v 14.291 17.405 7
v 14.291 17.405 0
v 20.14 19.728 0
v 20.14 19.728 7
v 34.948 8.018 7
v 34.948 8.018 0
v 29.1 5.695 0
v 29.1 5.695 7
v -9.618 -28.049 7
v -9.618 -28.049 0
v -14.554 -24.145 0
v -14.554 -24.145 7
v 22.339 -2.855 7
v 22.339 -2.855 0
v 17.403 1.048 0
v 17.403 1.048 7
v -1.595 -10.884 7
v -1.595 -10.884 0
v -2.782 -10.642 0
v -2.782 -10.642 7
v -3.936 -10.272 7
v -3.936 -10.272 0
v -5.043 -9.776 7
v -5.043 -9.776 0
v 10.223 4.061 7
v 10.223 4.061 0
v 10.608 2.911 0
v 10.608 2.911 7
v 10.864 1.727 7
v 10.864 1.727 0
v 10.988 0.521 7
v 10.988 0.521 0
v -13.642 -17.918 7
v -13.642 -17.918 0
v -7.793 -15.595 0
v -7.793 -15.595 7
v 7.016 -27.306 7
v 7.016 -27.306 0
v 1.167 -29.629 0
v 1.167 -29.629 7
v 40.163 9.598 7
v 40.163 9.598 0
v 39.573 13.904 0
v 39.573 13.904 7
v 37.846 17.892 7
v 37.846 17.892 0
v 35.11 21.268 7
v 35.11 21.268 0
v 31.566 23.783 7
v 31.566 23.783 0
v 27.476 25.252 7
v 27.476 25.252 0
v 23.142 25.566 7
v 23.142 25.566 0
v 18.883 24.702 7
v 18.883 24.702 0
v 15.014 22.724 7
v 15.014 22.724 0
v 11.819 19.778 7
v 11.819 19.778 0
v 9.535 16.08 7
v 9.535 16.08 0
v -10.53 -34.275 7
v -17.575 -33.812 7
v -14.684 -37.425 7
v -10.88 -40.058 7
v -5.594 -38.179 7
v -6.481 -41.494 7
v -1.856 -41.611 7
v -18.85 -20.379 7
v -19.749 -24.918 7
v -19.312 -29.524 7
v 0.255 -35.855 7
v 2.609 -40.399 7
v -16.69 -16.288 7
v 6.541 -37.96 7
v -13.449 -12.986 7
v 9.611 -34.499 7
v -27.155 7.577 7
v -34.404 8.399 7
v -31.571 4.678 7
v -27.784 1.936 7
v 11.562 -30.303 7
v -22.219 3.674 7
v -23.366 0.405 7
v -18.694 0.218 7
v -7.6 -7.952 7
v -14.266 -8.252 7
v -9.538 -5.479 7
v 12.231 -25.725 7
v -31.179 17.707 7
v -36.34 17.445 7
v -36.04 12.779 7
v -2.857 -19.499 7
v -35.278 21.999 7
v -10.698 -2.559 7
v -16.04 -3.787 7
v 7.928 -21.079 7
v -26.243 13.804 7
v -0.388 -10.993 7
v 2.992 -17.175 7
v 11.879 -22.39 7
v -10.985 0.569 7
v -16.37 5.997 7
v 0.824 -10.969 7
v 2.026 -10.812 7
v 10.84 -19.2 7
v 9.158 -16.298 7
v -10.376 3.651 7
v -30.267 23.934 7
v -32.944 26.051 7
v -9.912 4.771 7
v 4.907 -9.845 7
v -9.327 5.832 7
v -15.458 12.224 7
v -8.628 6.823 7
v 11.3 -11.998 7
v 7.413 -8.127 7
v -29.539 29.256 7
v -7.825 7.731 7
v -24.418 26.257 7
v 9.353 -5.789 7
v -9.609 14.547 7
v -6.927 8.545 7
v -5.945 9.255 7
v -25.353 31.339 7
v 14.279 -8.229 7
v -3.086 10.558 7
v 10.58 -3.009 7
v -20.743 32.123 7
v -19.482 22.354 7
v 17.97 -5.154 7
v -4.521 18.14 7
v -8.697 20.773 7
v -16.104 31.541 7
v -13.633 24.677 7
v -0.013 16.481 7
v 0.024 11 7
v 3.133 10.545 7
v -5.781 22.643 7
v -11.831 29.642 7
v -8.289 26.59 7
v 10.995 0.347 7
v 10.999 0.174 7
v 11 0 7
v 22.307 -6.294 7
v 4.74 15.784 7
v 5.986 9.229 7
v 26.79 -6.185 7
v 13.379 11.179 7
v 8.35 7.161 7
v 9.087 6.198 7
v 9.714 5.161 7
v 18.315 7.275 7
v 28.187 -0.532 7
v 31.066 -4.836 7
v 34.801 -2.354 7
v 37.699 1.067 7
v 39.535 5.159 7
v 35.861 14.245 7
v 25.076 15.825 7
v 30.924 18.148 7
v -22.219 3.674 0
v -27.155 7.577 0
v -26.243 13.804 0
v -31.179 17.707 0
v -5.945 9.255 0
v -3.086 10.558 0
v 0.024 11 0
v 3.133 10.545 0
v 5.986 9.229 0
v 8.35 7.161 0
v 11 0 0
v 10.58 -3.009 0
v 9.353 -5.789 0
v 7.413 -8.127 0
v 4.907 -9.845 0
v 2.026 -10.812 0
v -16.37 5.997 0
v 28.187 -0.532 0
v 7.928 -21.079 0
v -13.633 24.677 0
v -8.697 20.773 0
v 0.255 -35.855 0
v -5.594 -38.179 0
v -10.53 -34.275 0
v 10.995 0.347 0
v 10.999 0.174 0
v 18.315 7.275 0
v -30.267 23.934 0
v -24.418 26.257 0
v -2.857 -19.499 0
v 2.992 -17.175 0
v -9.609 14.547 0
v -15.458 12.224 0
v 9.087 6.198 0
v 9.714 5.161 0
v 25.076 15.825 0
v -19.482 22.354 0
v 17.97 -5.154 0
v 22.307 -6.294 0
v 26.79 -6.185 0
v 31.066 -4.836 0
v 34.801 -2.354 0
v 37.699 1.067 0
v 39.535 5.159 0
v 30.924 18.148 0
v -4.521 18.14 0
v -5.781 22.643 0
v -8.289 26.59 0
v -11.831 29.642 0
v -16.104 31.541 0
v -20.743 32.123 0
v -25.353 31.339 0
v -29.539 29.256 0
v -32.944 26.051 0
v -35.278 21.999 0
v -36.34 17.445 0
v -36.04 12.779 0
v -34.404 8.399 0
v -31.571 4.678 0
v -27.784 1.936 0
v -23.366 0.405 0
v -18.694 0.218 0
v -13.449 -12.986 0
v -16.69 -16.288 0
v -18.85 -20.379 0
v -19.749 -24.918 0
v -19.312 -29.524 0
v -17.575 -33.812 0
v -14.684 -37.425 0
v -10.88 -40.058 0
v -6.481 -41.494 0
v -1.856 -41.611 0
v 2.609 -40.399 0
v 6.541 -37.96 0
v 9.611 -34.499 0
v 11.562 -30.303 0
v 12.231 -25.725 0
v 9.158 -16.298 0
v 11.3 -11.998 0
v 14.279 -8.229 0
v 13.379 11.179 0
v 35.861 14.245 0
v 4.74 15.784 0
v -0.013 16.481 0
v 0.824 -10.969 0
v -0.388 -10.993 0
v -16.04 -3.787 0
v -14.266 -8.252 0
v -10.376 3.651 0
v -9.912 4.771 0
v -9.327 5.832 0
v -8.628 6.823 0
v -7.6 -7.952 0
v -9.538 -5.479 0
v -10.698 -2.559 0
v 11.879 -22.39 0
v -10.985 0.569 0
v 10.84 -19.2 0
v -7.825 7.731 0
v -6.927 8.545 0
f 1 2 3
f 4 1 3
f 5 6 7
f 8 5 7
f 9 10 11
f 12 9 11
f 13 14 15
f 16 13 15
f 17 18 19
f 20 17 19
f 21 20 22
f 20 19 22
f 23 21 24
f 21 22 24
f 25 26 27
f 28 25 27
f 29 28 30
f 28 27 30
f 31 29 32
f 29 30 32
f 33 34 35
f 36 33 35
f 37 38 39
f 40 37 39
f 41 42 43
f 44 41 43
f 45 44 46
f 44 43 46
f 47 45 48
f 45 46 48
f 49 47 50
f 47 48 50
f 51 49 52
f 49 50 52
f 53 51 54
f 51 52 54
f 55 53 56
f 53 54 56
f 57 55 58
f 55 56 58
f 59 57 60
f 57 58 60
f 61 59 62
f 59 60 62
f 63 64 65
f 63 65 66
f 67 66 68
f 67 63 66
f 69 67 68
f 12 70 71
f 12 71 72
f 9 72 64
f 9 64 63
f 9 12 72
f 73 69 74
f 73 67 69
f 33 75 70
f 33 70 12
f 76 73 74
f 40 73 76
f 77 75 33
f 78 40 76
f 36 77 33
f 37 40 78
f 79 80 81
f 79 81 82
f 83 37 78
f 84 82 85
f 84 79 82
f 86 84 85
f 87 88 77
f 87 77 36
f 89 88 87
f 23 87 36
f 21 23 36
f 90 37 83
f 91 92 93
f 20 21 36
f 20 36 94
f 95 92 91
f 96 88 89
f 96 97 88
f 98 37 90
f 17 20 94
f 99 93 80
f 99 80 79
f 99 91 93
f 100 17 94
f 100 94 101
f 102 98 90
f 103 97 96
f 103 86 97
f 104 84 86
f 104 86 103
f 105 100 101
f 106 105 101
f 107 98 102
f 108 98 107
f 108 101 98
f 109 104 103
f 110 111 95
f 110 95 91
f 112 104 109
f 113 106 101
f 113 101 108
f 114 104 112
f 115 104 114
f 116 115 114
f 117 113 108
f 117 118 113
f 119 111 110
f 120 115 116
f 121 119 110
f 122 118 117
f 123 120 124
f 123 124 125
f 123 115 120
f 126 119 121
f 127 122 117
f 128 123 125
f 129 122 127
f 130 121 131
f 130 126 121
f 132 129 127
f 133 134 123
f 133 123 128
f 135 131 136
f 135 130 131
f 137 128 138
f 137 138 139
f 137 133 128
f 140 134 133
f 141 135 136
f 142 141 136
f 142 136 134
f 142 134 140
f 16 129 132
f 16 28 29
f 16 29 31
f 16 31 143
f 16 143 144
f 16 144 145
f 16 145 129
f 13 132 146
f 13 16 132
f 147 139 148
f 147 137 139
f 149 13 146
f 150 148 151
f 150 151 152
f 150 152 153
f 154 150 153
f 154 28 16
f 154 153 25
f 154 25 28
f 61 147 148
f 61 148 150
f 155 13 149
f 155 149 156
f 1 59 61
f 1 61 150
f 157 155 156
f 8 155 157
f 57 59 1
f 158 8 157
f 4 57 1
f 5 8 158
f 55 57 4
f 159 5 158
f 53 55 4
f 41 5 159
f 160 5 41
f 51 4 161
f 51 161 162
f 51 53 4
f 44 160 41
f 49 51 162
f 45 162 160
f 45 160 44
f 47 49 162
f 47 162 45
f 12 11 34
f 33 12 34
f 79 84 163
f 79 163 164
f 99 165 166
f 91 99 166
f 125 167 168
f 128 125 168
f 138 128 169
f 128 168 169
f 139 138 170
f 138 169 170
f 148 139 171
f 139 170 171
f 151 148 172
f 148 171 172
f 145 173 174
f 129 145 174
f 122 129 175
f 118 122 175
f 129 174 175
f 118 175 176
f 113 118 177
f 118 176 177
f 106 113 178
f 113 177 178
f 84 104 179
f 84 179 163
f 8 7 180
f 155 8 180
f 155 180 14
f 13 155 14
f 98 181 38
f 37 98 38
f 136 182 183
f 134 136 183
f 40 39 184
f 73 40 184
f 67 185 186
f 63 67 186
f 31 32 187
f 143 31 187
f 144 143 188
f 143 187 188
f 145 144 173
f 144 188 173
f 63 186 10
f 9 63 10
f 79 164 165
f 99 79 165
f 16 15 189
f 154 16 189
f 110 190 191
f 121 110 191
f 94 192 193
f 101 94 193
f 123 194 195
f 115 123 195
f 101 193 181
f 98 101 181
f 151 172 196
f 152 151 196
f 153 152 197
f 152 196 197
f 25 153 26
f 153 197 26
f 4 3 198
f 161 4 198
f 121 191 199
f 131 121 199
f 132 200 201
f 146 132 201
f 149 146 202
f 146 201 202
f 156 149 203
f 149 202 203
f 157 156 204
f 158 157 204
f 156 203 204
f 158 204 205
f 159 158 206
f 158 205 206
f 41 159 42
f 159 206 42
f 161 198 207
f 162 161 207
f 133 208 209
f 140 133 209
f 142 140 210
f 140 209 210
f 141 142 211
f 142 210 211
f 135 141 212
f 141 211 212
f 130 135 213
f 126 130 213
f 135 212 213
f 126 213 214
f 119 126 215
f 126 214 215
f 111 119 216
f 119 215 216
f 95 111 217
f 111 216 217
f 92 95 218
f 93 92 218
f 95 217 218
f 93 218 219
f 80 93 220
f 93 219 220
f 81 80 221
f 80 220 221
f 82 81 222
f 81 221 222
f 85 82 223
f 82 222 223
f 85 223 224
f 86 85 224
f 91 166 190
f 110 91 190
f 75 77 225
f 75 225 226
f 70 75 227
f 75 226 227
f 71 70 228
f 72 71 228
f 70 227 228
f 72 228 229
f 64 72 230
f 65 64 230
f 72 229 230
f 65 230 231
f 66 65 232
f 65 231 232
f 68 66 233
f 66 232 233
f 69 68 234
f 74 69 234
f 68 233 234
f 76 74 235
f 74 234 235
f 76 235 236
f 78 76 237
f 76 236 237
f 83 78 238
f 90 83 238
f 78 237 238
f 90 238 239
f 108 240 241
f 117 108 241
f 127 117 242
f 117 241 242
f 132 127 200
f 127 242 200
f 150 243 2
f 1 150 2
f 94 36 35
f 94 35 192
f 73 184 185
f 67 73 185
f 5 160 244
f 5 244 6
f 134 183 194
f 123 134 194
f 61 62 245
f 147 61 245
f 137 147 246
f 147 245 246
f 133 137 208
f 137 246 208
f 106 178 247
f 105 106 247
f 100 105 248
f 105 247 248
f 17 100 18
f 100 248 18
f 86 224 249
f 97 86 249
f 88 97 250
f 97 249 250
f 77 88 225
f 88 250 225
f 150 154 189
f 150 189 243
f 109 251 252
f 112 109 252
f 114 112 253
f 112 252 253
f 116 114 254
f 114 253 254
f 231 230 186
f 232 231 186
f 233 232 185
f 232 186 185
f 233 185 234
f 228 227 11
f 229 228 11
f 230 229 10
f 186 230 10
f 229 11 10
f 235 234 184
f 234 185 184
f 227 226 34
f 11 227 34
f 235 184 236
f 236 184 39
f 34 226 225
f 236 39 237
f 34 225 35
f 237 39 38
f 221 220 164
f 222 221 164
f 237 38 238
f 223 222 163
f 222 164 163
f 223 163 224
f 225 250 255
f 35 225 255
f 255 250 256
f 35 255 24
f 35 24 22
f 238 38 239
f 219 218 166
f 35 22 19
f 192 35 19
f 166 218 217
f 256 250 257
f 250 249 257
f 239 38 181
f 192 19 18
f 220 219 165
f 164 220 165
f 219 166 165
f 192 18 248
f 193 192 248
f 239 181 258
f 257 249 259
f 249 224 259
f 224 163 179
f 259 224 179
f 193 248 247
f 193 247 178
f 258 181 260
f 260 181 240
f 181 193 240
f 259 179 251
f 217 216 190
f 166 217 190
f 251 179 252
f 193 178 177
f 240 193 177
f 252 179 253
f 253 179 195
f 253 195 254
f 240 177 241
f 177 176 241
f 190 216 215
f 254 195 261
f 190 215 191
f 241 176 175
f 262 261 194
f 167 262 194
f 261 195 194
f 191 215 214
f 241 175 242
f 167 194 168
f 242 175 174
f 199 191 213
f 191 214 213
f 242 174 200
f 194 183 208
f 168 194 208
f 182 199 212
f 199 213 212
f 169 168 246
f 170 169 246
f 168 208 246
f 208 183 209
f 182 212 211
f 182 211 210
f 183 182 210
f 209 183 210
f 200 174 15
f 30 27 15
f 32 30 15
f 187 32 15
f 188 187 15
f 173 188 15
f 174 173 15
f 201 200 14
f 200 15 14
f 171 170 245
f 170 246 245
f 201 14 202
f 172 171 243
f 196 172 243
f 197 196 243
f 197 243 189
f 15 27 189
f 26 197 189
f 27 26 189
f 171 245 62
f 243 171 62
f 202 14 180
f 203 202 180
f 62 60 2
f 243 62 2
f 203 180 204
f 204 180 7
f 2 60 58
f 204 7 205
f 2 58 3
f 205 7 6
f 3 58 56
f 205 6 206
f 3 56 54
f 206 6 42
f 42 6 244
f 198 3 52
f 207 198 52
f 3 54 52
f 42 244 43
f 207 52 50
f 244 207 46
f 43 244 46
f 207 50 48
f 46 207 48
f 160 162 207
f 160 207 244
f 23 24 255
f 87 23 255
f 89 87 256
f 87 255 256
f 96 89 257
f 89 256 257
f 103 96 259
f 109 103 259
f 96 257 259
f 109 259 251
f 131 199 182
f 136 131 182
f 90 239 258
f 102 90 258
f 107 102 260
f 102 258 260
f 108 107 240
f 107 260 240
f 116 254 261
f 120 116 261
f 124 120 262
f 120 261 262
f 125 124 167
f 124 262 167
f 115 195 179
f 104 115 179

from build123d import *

# Parameters (mm, degrees)
F1_DEPTH = 7


with BuildPart() as f1:
    # F0 (on Top) → F1 (new body)
    with BuildSketch(Plane.XY):
        with BuildLine():
            ThreePointArc((13.9404458706, 5.5375056594), (14.7327303657, 2.818981371), (15, 0))
            ThreePointArc((15, 0), (14.910105435, -1.6397426375), (14.641499211, -3.2598314149))
            ThreePointArc((14.641499211, -3.2598314149), (16.2490479671, -4.3071380253), (17.9703990001, -5.1544955417))
            ThreePointArc((17.9703990001, -5.1544955417), (20.0933334601, -3.8883563859), (22.3387689603, -2.8549259348))
            Line((22.3387689603, -2.8549259348), (17.4025129068, 1.0484968591))
            Line((17.4025129068, 1.0484968591), (18.3148481812, 7.2751313979))
            Line((18.3148481812, 7.2751313979), (13.9404458706, 5.5375056594))
        make_face()
        with BuildLine():
            ThreePointArc((8.413853575, 12.4180138516), (11.6946151785, 9.393400653), (13.9404458706, 5.5375056594))
            Line((13.9404458706, 5.5375056594), (18.3148481812, 7.2751313979))
            Line((18.3148481812, 7.2751313979), (13.3785921276, 11.1785541917))
            Line((13.3785921276, 11.1785541917), (14.290927402, 17.4051887306))
            ThreePointArc((14.290927402, 17.4051887306), (11.948407394, 16.6161645896), (9.5353183296, 16.0804778806))
            ThreePointArc((9.5353183296, 16.0804778806), (8.864593701, 14.2829260421), (8.413853575, 12.4180138516))
        make_face()
        with BuildLine():
            ThreePointArc((17.9703990001, -5.1544955417), (16.2490479671, -4.3071380253), (14.641499211, -3.2598314149))
            ThreePointArc((14.641499211, -3.2598314149), (11.76584351, -9.3040274344), (6.5473886725, -13.4956178655))
            ThreePointArc((6.5473886725, -13.4956178655), (7.9370799423, -14.8184263603), (9.1584431848, -16.2980668469))
            ThreePointArc((9.1584431848, -16.2980668469), (12.6917707898, -10.0362191218), (17.9703990001, -5.1544955417))
        make_face()
        with BuildLine():
            ThreePointArc((-4.4976527882, 14.3098259737), (2.1746023607, 14.8415330938), (8.413853575, 12.4180138516))
            ThreePointArc((8.413853575, 12.4180138516), (8.864593701, 14.2829260421), (9.5353183296, 16.0804778806))
            ThreePointArc((9.5353183296, 16.0804778806), (2.3457353225, 16.0095054839), (-4.5212754173, 18.1400698211))
            ThreePointArc((-4.5212754173, 18.1400698211), (-4.4259470549, 17.1355310008), (-4.3941287506, 16.1269808862))
            ThreePointArc((-4.3941287506, 16.1269808862), (-4.420030726, 15.216930173), (-4.4976527882, 14.3098259737))
        make_face()
        with BuildLine():
            ThreePointArc((9.1584431848, -16.2980668469), (7.9370799423, -14.8184263603), (6.5473886725, -13.4956178655))
            ThreePointArc((6.5473886725, -13.4956178655), (2.2876160042, -14.8245341585), (-2.1746023607, -14.8415330938))
            Line((-2.1746023607, -14.8415330938), (-2.8569754841, -19.4986894903))
            Line((-2.8569754841, -19.4986894903), (2.9916158438, -17.1754777453))
            Line((2.9916158438, -17.1754777453), (7.9278718973, -21.0789005391))
            ThreePointArc((7.9278718973, -21.0789005391), (8.4158169511, -18.6557066328), (9.1584431848, -16.2980668469))
        make_face()
        with BuildLine():
            ThreePointArc((22.3387689603, -2.8549259348), (20.0933334601, -3.8883563859), (17.9703990001, -5.1544955417))
            ThreePointArc((17.9703990001, -5.1544955417), (33.0209603772, -3.7262328005), (40.1634395091, 9.598343143))
            ThreePointArc((40.1634395091, 9.598343143), (27.4762978767, 25.2516165845), (9.5353183296, 16.0804778806))
            ThreePointArc((9.5353183296, 16.0804778806), (11.948407394, 16.6161645896), (14.290927402, 17.4051887306))
            Line((14.290927402, 17.4051887306), (20.1395187299, 19.7284004756))
            Line((20.1395187299, 19.7284004756), (25.0757747835, 15.8249776818))
            Line((25.0757747835, 15.8249776818), (30.9243661114, 18.1481894269))
            Line((30.9243661114, 18.1481894269), (35.8606221649, 14.244766633))
            Line((35.8606221649, 14.244766633), (34.9482868906, 8.0181320942))
            Line((34.9482868906, 8.0181320942), (29.0996955626, 5.6949203491))
            Line((29.0996955626, 5.6949203491), (28.1873602883, -0.5317141897))
            Line((28.1873602883, -0.5317141897), (22.3387689603, -2.8549259348))
        make_face()
        with BuildLine():
            ThreePointArc((-11.76584351, 9.3040274344), (-8.5082214777, 12.353548773), (-4.4976527882, 14.3098259737))
            ThreePointArc((-4.4976527882, 14.3098259737), (-4.420030726, 15.216930173), (-4.3941287506, 16.1269808862))
            ThreePointArc((-4.3941287506, 16.1269808862), (-4.4259470549, 17.1355310008), (-4.5212754173, 18.1400698211))
            ThreePointArc((-4.5212754173, 18.1400698211), (-6.6792513209, 19.3455154161), (-8.6969460947, 20.7734043763))
            Line((-8.6969460947, 20.7734043763), (-9.6092813691, 14.5467698375))
            Line((-9.6092813691, 14.5467698375), (-15.457872697, 12.2235580924))
            Line((-15.457872697, 12.2235580924), (-11.76584351, 9.3040274344))
        make_face()
        with BuildLine():
            Line((-2.8569754841, -19.4986894903), (-2.1746023607, -14.8415330938))
            ThreePointArc((-2.1746023607, -14.8415330938), (-6.4443763254, -13.5451103272), (-10.1438464229, -11.0499945588))
            ThreePointArc((-10.1438464229, -11.0499945588), (-11.8546149311, -11.9185193142), (-13.4491235829, -12.9855742794))
            ThreePointArc((-13.4491235829, -12.9855742794), (-13.4140821392, -15.4571590302), (-13.6418228656, -17.9184784416))
            Line((-13.6418228656, -17.9184784416), (-7.7932315377, -15.5952666965))
            Line((-7.7932315377, -15.5952666965), (-2.8569754841, -19.4986894903))
        make_face()
        with BuildLine():
            ThreePointArc((12.2306892415, -25.7253240292), (11.4432508781, -20.7677068139), (9.1584431848, -16.2980668469))
            ThreePointArc((9.1584431848, -16.2980668469), (8.4158169511, -18.6557066328), (7.9278718973, -21.0789005391))
            Line((7.9278718973, -21.0789005391), (7.0155366229, -27.3055350779))
            Line((7.0155366229, -27.3055350779), (1.166945295, -29.628746823))
            Line((1.166945295, -29.628746823), (0.2546100206, -35.8553813618))
            Line((0.2546100206, -35.8553813618), (-5.5939813073, -38.1785931069))
            Line((-5.5939813073, -38.1785931069), (-10.5302373608, -34.2751703131))
            Line((-10.5302373608, -34.2751703131), (-9.6179020864, -28.0485357742))
            Line((-9.6179020864, -28.0485357742), (-14.55415814, -24.1451129804))
            Line((-14.55415814, -24.1451129804), (-13.6418228656, -17.9184784416))
            ThreePointArc((-13.6418228656, -17.9184784416), (-13.4140821392, -15.4571590302), (-13.4491235829, -12.9855742794))
            ThreePointArc((-13.4491235829, -12.9855742794), (-10.8799715861, -40.0584500872), (12.2306892415, -25.7253240292))
        make_face()
        with BuildLine():
            ThreePointArc((-14.9612422475, 1.0776040139), (-13.9822311827, 5.4311335055), (-11.76584351, 9.3040274344))
            Line((-11.76584351, 9.3040274344), (-15.457872697, 12.2235580924))
            Line((-15.457872697, 12.2235580924), (-16.3702079714, 5.9969235536))
            Line((-16.3702079714, 5.9969235536), (-22.2187992993, 3.6737118085))
            ThreePointArc((-22.2187992993, 3.6737118085), (-20.3642243451, 2.0395420431), (-18.6937615143, 0.2175889663))
            ThreePointArc((-18.6937615143, 0.2175889663), (-16.8016736433, 0.5355003182), (-14.9612422475, 1.0776040139))
        make_face()
        with BuildLine():
            ThreePointArc((-8.6969460947, 20.7734043763), (-6.6792513209, 19.3455154161), (-4.5212754173, 18.1400698211))
            ThreePointArc((-4.5212754173, 18.1400698211), (-32.9443618279, 26.0512768162), (-18.6937615143, 0.2175889663))
            ThreePointArc((-18.6937615143, 0.2175889663), (-20.3642243451, 2.0395420431), (-22.2187992993, 3.6737118085))
            Line((-22.2187992993, 3.6737118085), (-27.1550553529, 7.5771346023))
            Line((-27.1550553529, 7.5771346023), (-26.2427200785, 13.8037691412))
            Line((-26.2427200785, 13.8037691412), (-31.178976132, 17.707191935))
            Line((-31.178976132, 17.707191935), (-30.2666408577, 23.9338264738))
            Line((-30.2666408577, 23.9338264738), (-24.4180495297, 26.2570382189))
            Line((-24.4180495297, 26.2570382189), (-19.4817934762, 22.3536154251))
            Line((-19.4817934762, 22.3536154251), (-13.6332021483, 24.6768271701))
            Line((-13.6332021483, 24.6768271701), (-8.6969460947, 20.7734043763))
        make_face()
        with BuildLine():
            ThreePointArc((-13.4491235829, -12.9855742794), (-11.8546149311, -11.9185193142), (-10.1438464229, -11.0499945588))
            ThreePointArc((-10.1438464229, -11.0499945588), (-13.9404458706, -5.5375056594), (-14.9612422475, 1.0776040139))
            ThreePointArc((-14.9612422475, 1.0776040139), (-16.8016736433, 0.5355003182), (-18.6937615143, 0.2175889663))
            ThreePointArc((-18.6937615143, 0.2175889663), (-15.0375061123, -5.9732863621), (-13.4491235829, -12.9855742794))
        make_face()
        with BuildLine():
            ThreePointArc((14.641499211, -3.2598314149), (14.910105435, -1.6397426375), (15, 0))
            ThreePointArc((15, 0), (14.7327303657, 2.818981371), (13.9404458706, 5.5375056594))
            Line((13.9404458706, 5.5375056594), (10.2229936385, 4.0608374836))
            ThreePointArc((10.2229936385, 4.0608374836), (10.7520038701, 2.3225875179), (10.9876563598, 0.5209680597))
            ThreePointArc((10.9876563598, 0.5209680597), (12.658211411, -1.5205473777), (14.641499211, -3.2598314149))
        make_face()
        with BuildLine():
            Line((10.2229936385, 4.0608374836), (13.9404458706, 5.5375056594))
            ThreePointArc((13.9404458706, 5.5375056594), (11.6946151785, 9.393400653), (8.413853575, 12.4180138516))
            ThreePointArc((8.413853575, 12.4180138516), (8.1646104404, 9.7919107843), (8.3502441941, 7.1605462012))
            ThreePointArc((8.3502441941, 7.1605462012), (9.4150591835, 5.6882915335), (10.2229936385, 4.0608374836))
        make_face()
        with BuildLine():
            ThreePointArc((-14.9612422475, 1.0776040139), (-13.9404458706, -5.5375056594), (-10.1438464229, -11.0499945588))
            ThreePointArc((-10.1438464229, -11.0499945588), (-7.6459383622, -10.2020589595), (-5.0426566056, -9.7760735655))
            ThreePointArc((-5.0426566056, -9.7760735655), (-10.2229936385, -4.0608374836), (-10.3763370122, 3.6512504993))
            ThreePointArc((-10.3763370122, 3.6512504993), (-12.562348711, 2.1748046613), (-14.9612422475, 1.0776040139))
        make_face()
        with BuildLine():
            Line((-8.6282852406, 6.8229534519), (-11.76584351, 9.3040274344))
            ThreePointArc((-11.76584351, 9.3040274344), (-13.9822311827, 5.4311335055), (-14.9612422475, 1.0776040139))
            ThreePointArc((-14.9612422475, 1.0776040139), (-12.562348711, 2.1748046613), (-10.3763370122, 3.6512504993))
            ThreePointArc((-10.3763370122, 3.6512504993), (-9.6337345639, 5.3095346643), (-8.6282852406, 6.8229534519))
        make_face()
        with BuildLine():
            ThreePointArc((-5.9449997541, 9.2551055058), (-5.0122730488, 11.7226063372), (-4.4976527882, 14.3098259737))
            ThreePointArc((-4.4976527882, 14.3098259737), (-8.5082214777, 12.353548773), (-11.76584351, 9.3040274344))
            Line((-11.76584351, 9.3040274344), (-8.6282852406, 6.8229534519))
            ThreePointArc((-8.6282852406, 6.8229534519), (-7.3874217281, 8.1502147341), (-5.9449997541, 9.2551055058))
        make_face()
        with BuildLine():
            ThreePointArc((-10.1438464229, -11.0499945588), (-6.4443763254, -13.5451103272), (-2.1746023607, -14.8415330938))
            Line((-2.1746023607, -14.8415330938), (-1.5947083978, -10.8837909354))
            ThreePointArc((-1.5947083978, -10.8837909354), (-3.364582142, -10.472802252), (-5.0426566056, -9.7760735655))
            ThreePointArc((-5.0426566056, -9.7760735655), (-7.6459383622, -10.2020589595), (-10.1438464229, -11.0499945588))
        make_face()
        with BuildLine():
            ThreePointArc((-2.1746023607, -14.8415330938), (2.2876160042, -14.8245341585), (6.5473886725, -13.4956178655))
            ThreePointArc((6.5473886725, -13.4956178655), (4.3977382706, -11.9667154456), (2.0260928181, -10.8117967005))
            ThreePointArc((2.0260928181, -10.8117967005), (0.2186753804, -10.9978261978), (-1.5947083978, -10.8837909354))
            Line((-1.5947083978, -10.8837909354), (-2.1746023607, -14.8415330938))
        make_face()
        with BuildLine():
            ThreePointArc((8.3502441941, 7.1605462012), (8.1646104404, 9.7919107843), (8.413853575, 12.4180138516))
            ThreePointArc((8.413853575, 12.4180138516), (2.1746023607, 14.8415330938), (-4.4976527882, 14.3098259737))
            ThreePointArc((-4.4976527882, 14.3098259737), (-5.0122730488, 11.7226063372), (-5.9449997541, 9.2551055058))
            ThreePointArc((-5.9449997541, 9.2551055058), (1.5947083978, 10.8837909354), (8.3502441941, 7.1605462012))
        make_face()
        with BuildLine():
            ThreePointArc((6.5473886725, -13.4956178655), (11.76584351, -9.3040274344), (14.641499211, -3.2598314149))
            ThreePointArc((14.641499211, -3.2598314149), (12.658211411, -1.5205473777), (10.9876563598, 0.5209680597))
            ThreePointArc((10.9876563598, 0.5209680597), (10.996913657, 0.2605571361), (11, 0))
            ThreePointArc((11, 0), (8.4642489625, -7.0254173898), (2.0260928181, -10.8117967005))
            ThreePointArc((2.0260928181, -10.8117967005), (4.3977382706, -11.9667154456), (6.5473886725, -13.4956178655))
        make_face()
    extrude(amount=F1_DEPTH)


solid = f1.part
